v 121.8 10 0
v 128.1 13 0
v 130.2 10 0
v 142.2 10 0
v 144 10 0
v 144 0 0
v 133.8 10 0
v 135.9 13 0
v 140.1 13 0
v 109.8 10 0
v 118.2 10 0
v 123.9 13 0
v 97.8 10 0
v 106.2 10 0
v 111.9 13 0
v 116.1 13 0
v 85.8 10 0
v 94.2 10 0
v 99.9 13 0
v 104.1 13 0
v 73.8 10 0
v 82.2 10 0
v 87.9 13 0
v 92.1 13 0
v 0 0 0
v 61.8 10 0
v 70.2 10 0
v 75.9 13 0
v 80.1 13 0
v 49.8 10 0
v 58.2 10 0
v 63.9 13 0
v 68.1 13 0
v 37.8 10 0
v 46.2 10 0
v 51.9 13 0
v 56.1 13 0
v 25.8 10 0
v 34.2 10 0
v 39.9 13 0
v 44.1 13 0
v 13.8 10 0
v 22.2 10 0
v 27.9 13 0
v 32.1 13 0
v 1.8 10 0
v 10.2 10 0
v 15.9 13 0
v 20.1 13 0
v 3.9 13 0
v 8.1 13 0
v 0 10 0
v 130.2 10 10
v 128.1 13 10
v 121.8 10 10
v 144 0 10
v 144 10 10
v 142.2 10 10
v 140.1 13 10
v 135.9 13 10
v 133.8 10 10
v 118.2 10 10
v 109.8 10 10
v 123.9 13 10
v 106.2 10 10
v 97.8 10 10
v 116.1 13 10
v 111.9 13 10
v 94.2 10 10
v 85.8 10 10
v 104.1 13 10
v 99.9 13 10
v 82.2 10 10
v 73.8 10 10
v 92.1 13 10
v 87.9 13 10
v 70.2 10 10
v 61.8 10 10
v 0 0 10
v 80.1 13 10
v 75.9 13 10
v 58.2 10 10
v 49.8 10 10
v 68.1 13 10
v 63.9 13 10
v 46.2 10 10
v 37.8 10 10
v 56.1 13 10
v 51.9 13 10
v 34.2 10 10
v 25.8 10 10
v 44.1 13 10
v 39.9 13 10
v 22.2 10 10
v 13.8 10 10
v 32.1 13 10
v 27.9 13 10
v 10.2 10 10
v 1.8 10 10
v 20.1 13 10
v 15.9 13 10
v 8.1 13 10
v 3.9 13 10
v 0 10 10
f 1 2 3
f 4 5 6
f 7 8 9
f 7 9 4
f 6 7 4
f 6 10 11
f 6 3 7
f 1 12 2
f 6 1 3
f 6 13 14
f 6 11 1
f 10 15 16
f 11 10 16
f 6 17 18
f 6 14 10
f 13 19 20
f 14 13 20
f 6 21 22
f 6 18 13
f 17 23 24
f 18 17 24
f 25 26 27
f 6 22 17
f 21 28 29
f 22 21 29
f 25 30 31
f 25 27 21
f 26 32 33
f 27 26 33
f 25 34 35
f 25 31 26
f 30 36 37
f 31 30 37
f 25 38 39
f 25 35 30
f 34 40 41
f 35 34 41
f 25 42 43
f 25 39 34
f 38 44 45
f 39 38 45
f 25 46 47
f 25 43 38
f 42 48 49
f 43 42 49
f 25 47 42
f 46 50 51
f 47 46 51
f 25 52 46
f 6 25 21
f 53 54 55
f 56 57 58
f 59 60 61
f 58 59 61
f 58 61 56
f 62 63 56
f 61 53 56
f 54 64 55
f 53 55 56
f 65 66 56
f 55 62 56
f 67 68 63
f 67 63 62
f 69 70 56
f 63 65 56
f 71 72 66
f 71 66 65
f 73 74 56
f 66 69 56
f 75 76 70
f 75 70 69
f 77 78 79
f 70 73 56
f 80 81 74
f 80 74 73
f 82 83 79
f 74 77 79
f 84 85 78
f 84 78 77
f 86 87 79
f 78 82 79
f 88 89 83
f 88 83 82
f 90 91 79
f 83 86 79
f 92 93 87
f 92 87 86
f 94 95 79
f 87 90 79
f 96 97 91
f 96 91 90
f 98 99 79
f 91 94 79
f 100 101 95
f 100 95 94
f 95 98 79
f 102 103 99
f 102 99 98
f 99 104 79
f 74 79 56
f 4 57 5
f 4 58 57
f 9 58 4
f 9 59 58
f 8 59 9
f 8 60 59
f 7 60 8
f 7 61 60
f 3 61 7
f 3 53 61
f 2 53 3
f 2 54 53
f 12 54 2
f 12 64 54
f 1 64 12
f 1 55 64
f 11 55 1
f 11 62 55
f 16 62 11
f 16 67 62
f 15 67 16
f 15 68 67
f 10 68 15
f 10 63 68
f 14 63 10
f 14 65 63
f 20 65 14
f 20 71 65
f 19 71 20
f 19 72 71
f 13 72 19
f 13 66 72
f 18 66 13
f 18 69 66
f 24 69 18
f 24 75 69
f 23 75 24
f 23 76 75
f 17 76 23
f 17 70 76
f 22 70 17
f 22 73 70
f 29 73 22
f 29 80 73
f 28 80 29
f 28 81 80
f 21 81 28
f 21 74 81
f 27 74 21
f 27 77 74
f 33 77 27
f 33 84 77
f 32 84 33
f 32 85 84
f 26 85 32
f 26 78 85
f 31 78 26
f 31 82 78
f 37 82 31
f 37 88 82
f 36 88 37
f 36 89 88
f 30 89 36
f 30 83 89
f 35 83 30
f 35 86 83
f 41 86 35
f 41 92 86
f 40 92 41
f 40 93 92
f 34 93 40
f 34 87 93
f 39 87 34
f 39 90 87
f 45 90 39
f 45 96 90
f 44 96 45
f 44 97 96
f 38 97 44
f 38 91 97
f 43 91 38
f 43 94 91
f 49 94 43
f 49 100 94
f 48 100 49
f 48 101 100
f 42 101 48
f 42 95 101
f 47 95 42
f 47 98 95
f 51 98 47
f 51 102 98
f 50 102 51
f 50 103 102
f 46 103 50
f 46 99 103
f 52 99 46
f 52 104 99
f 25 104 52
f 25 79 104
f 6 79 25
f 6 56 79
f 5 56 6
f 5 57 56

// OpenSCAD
$fn = 32;

// ----------------------------------------------------------------------
// Gear rack: 12 teeth, pitch 12 mm
// ----------------------------------------------------------------------

// --- parameters (mm) ---
teeth = 12;               // number of teeth
pitch = 12;               // tooth pitch, X
root_w = 8.4;             // tooth width at the root
tip_w = 4.2;              // tooth width at the tip
base_h = 10;              // rack body height, Y
tooth_h = 3;              // tooth height above the body
plate_t = 10;             // rack width, Z (extrusion height)
fit_tol = 0.1;            // declared fit tolerance (prompt contract)
free_tol = 0.3;           // declared free tolerance (prompt contract)

rack_l = teeth * pitch;  // overall length
total_h = base_h + tooth_h;  // overall height

profile = [[0, 0], [144, 0], [144, 10], [142.2, 10], [140.1, 13], [135.9, 13], [133.8, 10], [130.2, 10], [128.1, 13], [123.9, 13], [121.8, 10], [118.2, 10], [116.1, 13], [111.9, 13], [109.8, 10], [106.2, 10], [104.1, 13], [99.9, 13], [97.8, 10], [94.2, 10], [92.1, 13], [87.9, 13], [85.8, 10], [82.2, 10], [80.1, 13], [75.9, 13], [73.8, 10], [70.2, 10], [68.1, 13], [63.9, 13], [61.8, 10], [58.2, 10], [56.1, 13], [51.9, 13], [49.8, 10], [46.2, 10], [44.1, 13], [39.9, 13], [37.8, 10], [34.2, 10], [32.1, 13], [27.9, 13], [25.8, 10], [22.2, 10], [20.1, 13], [15.9, 13], [13.8, 10], [10.2, 10], [8.1, 13], [3.9, 13], [1.8, 10], [0, 10]];  // primary outline, 52 points, counter clockwise

// --- the one profile operation ---
linear_extrude(height = plate_t) polygon(points = profile);
